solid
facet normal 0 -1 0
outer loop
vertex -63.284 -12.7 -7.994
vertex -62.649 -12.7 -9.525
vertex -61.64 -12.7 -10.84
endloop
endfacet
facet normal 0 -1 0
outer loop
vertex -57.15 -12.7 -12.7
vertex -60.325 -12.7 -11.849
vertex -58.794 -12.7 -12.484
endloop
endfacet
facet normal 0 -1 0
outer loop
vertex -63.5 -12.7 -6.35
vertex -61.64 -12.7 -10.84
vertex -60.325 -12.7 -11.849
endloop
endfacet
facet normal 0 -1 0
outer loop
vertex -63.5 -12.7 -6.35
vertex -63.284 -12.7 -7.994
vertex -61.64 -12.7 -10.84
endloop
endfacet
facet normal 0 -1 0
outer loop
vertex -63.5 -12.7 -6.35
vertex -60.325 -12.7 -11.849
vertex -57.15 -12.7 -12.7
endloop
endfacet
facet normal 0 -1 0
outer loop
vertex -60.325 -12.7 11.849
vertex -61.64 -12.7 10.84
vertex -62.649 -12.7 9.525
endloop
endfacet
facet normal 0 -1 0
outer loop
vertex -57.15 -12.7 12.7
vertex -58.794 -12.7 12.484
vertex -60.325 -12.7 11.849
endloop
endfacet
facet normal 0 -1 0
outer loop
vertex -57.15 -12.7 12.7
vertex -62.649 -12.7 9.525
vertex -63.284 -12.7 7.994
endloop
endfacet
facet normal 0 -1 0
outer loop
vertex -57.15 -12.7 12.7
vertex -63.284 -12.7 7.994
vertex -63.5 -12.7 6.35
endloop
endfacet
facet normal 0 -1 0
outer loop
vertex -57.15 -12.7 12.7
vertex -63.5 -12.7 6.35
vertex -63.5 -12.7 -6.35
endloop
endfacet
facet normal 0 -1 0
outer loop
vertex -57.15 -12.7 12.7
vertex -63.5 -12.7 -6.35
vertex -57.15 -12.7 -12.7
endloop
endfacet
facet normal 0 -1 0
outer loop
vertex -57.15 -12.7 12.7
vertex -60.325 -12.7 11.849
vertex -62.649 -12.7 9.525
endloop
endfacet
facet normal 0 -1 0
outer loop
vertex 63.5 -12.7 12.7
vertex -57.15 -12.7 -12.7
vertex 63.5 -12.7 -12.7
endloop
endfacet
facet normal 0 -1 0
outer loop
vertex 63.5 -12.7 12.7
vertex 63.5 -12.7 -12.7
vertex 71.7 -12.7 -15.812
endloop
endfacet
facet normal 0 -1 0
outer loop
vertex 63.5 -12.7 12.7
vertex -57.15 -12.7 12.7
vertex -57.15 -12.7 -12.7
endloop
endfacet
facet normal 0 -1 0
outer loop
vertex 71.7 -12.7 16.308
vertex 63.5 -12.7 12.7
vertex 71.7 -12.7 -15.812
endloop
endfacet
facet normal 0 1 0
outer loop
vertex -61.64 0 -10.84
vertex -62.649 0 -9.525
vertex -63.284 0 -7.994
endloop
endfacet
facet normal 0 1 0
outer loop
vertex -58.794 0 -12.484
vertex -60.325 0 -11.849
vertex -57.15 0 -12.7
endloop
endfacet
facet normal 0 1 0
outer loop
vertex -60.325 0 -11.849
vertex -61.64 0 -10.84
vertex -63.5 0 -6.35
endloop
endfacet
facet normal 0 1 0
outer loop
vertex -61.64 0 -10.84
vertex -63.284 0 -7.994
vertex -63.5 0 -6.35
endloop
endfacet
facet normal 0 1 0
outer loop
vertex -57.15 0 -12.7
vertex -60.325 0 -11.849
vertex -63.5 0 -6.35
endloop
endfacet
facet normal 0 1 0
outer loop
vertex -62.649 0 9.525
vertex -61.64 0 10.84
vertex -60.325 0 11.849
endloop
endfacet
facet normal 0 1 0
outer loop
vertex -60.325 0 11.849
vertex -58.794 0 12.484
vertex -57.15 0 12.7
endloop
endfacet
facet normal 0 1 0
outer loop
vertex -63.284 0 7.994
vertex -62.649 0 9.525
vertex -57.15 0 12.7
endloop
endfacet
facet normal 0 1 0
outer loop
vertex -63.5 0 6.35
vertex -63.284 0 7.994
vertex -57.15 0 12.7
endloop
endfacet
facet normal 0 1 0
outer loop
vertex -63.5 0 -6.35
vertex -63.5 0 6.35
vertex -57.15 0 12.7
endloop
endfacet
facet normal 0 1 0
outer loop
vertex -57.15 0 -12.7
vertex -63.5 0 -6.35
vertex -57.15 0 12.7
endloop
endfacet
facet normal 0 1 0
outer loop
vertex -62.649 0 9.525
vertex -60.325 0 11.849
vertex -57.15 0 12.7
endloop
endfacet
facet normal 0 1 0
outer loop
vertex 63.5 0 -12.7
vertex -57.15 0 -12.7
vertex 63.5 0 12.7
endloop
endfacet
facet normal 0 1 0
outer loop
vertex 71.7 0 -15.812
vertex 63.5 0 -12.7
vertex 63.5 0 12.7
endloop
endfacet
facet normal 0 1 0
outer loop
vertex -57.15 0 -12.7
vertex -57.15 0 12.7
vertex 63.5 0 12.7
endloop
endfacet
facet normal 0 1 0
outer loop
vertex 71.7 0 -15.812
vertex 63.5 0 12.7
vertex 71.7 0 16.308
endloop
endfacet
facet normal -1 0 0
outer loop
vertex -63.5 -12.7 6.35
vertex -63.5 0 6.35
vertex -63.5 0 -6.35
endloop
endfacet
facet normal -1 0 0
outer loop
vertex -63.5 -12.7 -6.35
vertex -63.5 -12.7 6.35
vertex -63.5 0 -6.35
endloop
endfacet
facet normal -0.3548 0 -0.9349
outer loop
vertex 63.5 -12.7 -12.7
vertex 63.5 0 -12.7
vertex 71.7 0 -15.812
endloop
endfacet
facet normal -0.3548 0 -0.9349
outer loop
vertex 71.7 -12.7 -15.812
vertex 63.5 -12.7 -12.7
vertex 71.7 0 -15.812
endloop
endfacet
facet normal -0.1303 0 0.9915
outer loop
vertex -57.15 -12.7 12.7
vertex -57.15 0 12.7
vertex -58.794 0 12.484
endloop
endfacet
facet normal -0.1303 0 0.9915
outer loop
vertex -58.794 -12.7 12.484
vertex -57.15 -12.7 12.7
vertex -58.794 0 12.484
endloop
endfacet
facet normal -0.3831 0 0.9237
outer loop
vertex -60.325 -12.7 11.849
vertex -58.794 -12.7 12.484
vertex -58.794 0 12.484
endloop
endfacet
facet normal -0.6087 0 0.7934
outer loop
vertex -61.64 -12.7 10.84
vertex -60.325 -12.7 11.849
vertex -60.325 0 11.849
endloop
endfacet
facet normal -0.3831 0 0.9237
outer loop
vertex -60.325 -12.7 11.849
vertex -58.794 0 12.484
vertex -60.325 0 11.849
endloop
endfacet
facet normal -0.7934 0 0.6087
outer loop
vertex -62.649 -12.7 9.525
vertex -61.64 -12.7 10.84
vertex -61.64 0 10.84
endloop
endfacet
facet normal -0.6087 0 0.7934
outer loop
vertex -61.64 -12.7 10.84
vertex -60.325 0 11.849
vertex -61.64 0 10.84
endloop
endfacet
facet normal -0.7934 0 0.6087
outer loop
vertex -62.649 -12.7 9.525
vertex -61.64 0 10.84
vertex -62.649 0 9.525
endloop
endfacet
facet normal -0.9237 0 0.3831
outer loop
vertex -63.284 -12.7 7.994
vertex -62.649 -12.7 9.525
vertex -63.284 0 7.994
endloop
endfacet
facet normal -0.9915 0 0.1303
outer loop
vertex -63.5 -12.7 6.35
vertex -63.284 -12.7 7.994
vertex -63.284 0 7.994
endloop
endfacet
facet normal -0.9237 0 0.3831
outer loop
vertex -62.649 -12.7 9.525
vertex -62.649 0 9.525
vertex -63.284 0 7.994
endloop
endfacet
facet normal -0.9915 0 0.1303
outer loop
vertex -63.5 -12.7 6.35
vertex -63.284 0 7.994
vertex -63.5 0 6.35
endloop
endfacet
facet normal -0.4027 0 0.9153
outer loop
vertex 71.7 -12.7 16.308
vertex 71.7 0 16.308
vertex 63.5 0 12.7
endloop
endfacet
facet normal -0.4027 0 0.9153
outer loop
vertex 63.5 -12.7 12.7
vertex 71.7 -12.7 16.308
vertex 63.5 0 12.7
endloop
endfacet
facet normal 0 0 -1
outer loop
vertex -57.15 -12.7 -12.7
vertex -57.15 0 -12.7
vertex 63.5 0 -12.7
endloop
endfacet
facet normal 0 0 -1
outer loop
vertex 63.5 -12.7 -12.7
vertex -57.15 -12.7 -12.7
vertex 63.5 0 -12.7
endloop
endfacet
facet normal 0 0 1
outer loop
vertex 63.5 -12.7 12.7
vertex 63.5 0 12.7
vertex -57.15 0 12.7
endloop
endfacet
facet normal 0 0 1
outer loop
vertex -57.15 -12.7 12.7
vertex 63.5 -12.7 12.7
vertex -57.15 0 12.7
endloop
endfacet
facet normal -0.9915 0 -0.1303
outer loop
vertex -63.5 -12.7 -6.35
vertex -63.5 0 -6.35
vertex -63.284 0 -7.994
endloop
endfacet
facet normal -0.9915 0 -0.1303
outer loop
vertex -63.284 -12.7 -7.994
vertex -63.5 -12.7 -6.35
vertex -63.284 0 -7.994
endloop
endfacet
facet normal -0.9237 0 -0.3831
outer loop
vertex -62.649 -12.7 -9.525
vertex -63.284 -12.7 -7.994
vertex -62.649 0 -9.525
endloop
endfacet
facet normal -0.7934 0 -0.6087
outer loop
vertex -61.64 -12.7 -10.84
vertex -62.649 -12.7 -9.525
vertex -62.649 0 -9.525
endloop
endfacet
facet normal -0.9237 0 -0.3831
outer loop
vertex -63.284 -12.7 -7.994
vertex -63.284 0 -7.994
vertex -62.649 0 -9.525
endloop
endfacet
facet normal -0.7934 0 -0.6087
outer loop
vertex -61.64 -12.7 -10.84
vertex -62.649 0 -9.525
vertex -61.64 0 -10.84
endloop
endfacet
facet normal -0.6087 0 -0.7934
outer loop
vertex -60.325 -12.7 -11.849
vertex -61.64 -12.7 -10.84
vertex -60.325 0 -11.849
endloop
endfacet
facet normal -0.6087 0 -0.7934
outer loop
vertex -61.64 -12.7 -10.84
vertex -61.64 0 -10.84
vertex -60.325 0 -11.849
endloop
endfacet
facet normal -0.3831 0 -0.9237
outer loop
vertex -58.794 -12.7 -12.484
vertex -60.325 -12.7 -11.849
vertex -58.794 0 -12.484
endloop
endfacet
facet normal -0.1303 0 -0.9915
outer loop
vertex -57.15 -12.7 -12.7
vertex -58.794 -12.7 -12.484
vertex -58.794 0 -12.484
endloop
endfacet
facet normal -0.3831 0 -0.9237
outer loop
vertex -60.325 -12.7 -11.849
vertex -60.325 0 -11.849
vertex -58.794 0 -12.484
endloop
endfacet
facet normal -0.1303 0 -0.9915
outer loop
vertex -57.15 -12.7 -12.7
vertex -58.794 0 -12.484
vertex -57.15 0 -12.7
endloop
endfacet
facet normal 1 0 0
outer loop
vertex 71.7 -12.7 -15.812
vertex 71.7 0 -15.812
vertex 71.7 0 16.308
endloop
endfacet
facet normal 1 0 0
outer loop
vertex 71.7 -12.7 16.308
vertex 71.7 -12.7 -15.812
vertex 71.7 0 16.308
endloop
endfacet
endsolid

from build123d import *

# Parameters (mm, degrees)
F1_DEPTH = 12.7


with BuildPart() as f1:
    # F0 (on Front) → F1 (new body)
    with BuildSketch(Plane.XZ):
        Polygon((71.700338, 16.308149), (63.5, 12.7), (63.5, -12.7), (71.700338, -15.811923), align=None)
        with BuildLine():
            Line((63.5, 12.7), (-57.15, 12.7))
            ThreePointArc((-57.15, 12.7), (-61.640128, 10.840128), (-63.5, 6.35))
            Line((-63.5, 6.35), (-63.5, -6.35))
            ThreePointArc((-63.5, -6.35), (-61.640128, -10.840128), (-57.15, -12.7))
            Line((-57.15, -12.7), (63.5, -12.7))
            Line((63.5, -12.7), (63.5, 12.7))
        make_face()
    extrude(amount=F1_DEPTH)


solid = f1.part
